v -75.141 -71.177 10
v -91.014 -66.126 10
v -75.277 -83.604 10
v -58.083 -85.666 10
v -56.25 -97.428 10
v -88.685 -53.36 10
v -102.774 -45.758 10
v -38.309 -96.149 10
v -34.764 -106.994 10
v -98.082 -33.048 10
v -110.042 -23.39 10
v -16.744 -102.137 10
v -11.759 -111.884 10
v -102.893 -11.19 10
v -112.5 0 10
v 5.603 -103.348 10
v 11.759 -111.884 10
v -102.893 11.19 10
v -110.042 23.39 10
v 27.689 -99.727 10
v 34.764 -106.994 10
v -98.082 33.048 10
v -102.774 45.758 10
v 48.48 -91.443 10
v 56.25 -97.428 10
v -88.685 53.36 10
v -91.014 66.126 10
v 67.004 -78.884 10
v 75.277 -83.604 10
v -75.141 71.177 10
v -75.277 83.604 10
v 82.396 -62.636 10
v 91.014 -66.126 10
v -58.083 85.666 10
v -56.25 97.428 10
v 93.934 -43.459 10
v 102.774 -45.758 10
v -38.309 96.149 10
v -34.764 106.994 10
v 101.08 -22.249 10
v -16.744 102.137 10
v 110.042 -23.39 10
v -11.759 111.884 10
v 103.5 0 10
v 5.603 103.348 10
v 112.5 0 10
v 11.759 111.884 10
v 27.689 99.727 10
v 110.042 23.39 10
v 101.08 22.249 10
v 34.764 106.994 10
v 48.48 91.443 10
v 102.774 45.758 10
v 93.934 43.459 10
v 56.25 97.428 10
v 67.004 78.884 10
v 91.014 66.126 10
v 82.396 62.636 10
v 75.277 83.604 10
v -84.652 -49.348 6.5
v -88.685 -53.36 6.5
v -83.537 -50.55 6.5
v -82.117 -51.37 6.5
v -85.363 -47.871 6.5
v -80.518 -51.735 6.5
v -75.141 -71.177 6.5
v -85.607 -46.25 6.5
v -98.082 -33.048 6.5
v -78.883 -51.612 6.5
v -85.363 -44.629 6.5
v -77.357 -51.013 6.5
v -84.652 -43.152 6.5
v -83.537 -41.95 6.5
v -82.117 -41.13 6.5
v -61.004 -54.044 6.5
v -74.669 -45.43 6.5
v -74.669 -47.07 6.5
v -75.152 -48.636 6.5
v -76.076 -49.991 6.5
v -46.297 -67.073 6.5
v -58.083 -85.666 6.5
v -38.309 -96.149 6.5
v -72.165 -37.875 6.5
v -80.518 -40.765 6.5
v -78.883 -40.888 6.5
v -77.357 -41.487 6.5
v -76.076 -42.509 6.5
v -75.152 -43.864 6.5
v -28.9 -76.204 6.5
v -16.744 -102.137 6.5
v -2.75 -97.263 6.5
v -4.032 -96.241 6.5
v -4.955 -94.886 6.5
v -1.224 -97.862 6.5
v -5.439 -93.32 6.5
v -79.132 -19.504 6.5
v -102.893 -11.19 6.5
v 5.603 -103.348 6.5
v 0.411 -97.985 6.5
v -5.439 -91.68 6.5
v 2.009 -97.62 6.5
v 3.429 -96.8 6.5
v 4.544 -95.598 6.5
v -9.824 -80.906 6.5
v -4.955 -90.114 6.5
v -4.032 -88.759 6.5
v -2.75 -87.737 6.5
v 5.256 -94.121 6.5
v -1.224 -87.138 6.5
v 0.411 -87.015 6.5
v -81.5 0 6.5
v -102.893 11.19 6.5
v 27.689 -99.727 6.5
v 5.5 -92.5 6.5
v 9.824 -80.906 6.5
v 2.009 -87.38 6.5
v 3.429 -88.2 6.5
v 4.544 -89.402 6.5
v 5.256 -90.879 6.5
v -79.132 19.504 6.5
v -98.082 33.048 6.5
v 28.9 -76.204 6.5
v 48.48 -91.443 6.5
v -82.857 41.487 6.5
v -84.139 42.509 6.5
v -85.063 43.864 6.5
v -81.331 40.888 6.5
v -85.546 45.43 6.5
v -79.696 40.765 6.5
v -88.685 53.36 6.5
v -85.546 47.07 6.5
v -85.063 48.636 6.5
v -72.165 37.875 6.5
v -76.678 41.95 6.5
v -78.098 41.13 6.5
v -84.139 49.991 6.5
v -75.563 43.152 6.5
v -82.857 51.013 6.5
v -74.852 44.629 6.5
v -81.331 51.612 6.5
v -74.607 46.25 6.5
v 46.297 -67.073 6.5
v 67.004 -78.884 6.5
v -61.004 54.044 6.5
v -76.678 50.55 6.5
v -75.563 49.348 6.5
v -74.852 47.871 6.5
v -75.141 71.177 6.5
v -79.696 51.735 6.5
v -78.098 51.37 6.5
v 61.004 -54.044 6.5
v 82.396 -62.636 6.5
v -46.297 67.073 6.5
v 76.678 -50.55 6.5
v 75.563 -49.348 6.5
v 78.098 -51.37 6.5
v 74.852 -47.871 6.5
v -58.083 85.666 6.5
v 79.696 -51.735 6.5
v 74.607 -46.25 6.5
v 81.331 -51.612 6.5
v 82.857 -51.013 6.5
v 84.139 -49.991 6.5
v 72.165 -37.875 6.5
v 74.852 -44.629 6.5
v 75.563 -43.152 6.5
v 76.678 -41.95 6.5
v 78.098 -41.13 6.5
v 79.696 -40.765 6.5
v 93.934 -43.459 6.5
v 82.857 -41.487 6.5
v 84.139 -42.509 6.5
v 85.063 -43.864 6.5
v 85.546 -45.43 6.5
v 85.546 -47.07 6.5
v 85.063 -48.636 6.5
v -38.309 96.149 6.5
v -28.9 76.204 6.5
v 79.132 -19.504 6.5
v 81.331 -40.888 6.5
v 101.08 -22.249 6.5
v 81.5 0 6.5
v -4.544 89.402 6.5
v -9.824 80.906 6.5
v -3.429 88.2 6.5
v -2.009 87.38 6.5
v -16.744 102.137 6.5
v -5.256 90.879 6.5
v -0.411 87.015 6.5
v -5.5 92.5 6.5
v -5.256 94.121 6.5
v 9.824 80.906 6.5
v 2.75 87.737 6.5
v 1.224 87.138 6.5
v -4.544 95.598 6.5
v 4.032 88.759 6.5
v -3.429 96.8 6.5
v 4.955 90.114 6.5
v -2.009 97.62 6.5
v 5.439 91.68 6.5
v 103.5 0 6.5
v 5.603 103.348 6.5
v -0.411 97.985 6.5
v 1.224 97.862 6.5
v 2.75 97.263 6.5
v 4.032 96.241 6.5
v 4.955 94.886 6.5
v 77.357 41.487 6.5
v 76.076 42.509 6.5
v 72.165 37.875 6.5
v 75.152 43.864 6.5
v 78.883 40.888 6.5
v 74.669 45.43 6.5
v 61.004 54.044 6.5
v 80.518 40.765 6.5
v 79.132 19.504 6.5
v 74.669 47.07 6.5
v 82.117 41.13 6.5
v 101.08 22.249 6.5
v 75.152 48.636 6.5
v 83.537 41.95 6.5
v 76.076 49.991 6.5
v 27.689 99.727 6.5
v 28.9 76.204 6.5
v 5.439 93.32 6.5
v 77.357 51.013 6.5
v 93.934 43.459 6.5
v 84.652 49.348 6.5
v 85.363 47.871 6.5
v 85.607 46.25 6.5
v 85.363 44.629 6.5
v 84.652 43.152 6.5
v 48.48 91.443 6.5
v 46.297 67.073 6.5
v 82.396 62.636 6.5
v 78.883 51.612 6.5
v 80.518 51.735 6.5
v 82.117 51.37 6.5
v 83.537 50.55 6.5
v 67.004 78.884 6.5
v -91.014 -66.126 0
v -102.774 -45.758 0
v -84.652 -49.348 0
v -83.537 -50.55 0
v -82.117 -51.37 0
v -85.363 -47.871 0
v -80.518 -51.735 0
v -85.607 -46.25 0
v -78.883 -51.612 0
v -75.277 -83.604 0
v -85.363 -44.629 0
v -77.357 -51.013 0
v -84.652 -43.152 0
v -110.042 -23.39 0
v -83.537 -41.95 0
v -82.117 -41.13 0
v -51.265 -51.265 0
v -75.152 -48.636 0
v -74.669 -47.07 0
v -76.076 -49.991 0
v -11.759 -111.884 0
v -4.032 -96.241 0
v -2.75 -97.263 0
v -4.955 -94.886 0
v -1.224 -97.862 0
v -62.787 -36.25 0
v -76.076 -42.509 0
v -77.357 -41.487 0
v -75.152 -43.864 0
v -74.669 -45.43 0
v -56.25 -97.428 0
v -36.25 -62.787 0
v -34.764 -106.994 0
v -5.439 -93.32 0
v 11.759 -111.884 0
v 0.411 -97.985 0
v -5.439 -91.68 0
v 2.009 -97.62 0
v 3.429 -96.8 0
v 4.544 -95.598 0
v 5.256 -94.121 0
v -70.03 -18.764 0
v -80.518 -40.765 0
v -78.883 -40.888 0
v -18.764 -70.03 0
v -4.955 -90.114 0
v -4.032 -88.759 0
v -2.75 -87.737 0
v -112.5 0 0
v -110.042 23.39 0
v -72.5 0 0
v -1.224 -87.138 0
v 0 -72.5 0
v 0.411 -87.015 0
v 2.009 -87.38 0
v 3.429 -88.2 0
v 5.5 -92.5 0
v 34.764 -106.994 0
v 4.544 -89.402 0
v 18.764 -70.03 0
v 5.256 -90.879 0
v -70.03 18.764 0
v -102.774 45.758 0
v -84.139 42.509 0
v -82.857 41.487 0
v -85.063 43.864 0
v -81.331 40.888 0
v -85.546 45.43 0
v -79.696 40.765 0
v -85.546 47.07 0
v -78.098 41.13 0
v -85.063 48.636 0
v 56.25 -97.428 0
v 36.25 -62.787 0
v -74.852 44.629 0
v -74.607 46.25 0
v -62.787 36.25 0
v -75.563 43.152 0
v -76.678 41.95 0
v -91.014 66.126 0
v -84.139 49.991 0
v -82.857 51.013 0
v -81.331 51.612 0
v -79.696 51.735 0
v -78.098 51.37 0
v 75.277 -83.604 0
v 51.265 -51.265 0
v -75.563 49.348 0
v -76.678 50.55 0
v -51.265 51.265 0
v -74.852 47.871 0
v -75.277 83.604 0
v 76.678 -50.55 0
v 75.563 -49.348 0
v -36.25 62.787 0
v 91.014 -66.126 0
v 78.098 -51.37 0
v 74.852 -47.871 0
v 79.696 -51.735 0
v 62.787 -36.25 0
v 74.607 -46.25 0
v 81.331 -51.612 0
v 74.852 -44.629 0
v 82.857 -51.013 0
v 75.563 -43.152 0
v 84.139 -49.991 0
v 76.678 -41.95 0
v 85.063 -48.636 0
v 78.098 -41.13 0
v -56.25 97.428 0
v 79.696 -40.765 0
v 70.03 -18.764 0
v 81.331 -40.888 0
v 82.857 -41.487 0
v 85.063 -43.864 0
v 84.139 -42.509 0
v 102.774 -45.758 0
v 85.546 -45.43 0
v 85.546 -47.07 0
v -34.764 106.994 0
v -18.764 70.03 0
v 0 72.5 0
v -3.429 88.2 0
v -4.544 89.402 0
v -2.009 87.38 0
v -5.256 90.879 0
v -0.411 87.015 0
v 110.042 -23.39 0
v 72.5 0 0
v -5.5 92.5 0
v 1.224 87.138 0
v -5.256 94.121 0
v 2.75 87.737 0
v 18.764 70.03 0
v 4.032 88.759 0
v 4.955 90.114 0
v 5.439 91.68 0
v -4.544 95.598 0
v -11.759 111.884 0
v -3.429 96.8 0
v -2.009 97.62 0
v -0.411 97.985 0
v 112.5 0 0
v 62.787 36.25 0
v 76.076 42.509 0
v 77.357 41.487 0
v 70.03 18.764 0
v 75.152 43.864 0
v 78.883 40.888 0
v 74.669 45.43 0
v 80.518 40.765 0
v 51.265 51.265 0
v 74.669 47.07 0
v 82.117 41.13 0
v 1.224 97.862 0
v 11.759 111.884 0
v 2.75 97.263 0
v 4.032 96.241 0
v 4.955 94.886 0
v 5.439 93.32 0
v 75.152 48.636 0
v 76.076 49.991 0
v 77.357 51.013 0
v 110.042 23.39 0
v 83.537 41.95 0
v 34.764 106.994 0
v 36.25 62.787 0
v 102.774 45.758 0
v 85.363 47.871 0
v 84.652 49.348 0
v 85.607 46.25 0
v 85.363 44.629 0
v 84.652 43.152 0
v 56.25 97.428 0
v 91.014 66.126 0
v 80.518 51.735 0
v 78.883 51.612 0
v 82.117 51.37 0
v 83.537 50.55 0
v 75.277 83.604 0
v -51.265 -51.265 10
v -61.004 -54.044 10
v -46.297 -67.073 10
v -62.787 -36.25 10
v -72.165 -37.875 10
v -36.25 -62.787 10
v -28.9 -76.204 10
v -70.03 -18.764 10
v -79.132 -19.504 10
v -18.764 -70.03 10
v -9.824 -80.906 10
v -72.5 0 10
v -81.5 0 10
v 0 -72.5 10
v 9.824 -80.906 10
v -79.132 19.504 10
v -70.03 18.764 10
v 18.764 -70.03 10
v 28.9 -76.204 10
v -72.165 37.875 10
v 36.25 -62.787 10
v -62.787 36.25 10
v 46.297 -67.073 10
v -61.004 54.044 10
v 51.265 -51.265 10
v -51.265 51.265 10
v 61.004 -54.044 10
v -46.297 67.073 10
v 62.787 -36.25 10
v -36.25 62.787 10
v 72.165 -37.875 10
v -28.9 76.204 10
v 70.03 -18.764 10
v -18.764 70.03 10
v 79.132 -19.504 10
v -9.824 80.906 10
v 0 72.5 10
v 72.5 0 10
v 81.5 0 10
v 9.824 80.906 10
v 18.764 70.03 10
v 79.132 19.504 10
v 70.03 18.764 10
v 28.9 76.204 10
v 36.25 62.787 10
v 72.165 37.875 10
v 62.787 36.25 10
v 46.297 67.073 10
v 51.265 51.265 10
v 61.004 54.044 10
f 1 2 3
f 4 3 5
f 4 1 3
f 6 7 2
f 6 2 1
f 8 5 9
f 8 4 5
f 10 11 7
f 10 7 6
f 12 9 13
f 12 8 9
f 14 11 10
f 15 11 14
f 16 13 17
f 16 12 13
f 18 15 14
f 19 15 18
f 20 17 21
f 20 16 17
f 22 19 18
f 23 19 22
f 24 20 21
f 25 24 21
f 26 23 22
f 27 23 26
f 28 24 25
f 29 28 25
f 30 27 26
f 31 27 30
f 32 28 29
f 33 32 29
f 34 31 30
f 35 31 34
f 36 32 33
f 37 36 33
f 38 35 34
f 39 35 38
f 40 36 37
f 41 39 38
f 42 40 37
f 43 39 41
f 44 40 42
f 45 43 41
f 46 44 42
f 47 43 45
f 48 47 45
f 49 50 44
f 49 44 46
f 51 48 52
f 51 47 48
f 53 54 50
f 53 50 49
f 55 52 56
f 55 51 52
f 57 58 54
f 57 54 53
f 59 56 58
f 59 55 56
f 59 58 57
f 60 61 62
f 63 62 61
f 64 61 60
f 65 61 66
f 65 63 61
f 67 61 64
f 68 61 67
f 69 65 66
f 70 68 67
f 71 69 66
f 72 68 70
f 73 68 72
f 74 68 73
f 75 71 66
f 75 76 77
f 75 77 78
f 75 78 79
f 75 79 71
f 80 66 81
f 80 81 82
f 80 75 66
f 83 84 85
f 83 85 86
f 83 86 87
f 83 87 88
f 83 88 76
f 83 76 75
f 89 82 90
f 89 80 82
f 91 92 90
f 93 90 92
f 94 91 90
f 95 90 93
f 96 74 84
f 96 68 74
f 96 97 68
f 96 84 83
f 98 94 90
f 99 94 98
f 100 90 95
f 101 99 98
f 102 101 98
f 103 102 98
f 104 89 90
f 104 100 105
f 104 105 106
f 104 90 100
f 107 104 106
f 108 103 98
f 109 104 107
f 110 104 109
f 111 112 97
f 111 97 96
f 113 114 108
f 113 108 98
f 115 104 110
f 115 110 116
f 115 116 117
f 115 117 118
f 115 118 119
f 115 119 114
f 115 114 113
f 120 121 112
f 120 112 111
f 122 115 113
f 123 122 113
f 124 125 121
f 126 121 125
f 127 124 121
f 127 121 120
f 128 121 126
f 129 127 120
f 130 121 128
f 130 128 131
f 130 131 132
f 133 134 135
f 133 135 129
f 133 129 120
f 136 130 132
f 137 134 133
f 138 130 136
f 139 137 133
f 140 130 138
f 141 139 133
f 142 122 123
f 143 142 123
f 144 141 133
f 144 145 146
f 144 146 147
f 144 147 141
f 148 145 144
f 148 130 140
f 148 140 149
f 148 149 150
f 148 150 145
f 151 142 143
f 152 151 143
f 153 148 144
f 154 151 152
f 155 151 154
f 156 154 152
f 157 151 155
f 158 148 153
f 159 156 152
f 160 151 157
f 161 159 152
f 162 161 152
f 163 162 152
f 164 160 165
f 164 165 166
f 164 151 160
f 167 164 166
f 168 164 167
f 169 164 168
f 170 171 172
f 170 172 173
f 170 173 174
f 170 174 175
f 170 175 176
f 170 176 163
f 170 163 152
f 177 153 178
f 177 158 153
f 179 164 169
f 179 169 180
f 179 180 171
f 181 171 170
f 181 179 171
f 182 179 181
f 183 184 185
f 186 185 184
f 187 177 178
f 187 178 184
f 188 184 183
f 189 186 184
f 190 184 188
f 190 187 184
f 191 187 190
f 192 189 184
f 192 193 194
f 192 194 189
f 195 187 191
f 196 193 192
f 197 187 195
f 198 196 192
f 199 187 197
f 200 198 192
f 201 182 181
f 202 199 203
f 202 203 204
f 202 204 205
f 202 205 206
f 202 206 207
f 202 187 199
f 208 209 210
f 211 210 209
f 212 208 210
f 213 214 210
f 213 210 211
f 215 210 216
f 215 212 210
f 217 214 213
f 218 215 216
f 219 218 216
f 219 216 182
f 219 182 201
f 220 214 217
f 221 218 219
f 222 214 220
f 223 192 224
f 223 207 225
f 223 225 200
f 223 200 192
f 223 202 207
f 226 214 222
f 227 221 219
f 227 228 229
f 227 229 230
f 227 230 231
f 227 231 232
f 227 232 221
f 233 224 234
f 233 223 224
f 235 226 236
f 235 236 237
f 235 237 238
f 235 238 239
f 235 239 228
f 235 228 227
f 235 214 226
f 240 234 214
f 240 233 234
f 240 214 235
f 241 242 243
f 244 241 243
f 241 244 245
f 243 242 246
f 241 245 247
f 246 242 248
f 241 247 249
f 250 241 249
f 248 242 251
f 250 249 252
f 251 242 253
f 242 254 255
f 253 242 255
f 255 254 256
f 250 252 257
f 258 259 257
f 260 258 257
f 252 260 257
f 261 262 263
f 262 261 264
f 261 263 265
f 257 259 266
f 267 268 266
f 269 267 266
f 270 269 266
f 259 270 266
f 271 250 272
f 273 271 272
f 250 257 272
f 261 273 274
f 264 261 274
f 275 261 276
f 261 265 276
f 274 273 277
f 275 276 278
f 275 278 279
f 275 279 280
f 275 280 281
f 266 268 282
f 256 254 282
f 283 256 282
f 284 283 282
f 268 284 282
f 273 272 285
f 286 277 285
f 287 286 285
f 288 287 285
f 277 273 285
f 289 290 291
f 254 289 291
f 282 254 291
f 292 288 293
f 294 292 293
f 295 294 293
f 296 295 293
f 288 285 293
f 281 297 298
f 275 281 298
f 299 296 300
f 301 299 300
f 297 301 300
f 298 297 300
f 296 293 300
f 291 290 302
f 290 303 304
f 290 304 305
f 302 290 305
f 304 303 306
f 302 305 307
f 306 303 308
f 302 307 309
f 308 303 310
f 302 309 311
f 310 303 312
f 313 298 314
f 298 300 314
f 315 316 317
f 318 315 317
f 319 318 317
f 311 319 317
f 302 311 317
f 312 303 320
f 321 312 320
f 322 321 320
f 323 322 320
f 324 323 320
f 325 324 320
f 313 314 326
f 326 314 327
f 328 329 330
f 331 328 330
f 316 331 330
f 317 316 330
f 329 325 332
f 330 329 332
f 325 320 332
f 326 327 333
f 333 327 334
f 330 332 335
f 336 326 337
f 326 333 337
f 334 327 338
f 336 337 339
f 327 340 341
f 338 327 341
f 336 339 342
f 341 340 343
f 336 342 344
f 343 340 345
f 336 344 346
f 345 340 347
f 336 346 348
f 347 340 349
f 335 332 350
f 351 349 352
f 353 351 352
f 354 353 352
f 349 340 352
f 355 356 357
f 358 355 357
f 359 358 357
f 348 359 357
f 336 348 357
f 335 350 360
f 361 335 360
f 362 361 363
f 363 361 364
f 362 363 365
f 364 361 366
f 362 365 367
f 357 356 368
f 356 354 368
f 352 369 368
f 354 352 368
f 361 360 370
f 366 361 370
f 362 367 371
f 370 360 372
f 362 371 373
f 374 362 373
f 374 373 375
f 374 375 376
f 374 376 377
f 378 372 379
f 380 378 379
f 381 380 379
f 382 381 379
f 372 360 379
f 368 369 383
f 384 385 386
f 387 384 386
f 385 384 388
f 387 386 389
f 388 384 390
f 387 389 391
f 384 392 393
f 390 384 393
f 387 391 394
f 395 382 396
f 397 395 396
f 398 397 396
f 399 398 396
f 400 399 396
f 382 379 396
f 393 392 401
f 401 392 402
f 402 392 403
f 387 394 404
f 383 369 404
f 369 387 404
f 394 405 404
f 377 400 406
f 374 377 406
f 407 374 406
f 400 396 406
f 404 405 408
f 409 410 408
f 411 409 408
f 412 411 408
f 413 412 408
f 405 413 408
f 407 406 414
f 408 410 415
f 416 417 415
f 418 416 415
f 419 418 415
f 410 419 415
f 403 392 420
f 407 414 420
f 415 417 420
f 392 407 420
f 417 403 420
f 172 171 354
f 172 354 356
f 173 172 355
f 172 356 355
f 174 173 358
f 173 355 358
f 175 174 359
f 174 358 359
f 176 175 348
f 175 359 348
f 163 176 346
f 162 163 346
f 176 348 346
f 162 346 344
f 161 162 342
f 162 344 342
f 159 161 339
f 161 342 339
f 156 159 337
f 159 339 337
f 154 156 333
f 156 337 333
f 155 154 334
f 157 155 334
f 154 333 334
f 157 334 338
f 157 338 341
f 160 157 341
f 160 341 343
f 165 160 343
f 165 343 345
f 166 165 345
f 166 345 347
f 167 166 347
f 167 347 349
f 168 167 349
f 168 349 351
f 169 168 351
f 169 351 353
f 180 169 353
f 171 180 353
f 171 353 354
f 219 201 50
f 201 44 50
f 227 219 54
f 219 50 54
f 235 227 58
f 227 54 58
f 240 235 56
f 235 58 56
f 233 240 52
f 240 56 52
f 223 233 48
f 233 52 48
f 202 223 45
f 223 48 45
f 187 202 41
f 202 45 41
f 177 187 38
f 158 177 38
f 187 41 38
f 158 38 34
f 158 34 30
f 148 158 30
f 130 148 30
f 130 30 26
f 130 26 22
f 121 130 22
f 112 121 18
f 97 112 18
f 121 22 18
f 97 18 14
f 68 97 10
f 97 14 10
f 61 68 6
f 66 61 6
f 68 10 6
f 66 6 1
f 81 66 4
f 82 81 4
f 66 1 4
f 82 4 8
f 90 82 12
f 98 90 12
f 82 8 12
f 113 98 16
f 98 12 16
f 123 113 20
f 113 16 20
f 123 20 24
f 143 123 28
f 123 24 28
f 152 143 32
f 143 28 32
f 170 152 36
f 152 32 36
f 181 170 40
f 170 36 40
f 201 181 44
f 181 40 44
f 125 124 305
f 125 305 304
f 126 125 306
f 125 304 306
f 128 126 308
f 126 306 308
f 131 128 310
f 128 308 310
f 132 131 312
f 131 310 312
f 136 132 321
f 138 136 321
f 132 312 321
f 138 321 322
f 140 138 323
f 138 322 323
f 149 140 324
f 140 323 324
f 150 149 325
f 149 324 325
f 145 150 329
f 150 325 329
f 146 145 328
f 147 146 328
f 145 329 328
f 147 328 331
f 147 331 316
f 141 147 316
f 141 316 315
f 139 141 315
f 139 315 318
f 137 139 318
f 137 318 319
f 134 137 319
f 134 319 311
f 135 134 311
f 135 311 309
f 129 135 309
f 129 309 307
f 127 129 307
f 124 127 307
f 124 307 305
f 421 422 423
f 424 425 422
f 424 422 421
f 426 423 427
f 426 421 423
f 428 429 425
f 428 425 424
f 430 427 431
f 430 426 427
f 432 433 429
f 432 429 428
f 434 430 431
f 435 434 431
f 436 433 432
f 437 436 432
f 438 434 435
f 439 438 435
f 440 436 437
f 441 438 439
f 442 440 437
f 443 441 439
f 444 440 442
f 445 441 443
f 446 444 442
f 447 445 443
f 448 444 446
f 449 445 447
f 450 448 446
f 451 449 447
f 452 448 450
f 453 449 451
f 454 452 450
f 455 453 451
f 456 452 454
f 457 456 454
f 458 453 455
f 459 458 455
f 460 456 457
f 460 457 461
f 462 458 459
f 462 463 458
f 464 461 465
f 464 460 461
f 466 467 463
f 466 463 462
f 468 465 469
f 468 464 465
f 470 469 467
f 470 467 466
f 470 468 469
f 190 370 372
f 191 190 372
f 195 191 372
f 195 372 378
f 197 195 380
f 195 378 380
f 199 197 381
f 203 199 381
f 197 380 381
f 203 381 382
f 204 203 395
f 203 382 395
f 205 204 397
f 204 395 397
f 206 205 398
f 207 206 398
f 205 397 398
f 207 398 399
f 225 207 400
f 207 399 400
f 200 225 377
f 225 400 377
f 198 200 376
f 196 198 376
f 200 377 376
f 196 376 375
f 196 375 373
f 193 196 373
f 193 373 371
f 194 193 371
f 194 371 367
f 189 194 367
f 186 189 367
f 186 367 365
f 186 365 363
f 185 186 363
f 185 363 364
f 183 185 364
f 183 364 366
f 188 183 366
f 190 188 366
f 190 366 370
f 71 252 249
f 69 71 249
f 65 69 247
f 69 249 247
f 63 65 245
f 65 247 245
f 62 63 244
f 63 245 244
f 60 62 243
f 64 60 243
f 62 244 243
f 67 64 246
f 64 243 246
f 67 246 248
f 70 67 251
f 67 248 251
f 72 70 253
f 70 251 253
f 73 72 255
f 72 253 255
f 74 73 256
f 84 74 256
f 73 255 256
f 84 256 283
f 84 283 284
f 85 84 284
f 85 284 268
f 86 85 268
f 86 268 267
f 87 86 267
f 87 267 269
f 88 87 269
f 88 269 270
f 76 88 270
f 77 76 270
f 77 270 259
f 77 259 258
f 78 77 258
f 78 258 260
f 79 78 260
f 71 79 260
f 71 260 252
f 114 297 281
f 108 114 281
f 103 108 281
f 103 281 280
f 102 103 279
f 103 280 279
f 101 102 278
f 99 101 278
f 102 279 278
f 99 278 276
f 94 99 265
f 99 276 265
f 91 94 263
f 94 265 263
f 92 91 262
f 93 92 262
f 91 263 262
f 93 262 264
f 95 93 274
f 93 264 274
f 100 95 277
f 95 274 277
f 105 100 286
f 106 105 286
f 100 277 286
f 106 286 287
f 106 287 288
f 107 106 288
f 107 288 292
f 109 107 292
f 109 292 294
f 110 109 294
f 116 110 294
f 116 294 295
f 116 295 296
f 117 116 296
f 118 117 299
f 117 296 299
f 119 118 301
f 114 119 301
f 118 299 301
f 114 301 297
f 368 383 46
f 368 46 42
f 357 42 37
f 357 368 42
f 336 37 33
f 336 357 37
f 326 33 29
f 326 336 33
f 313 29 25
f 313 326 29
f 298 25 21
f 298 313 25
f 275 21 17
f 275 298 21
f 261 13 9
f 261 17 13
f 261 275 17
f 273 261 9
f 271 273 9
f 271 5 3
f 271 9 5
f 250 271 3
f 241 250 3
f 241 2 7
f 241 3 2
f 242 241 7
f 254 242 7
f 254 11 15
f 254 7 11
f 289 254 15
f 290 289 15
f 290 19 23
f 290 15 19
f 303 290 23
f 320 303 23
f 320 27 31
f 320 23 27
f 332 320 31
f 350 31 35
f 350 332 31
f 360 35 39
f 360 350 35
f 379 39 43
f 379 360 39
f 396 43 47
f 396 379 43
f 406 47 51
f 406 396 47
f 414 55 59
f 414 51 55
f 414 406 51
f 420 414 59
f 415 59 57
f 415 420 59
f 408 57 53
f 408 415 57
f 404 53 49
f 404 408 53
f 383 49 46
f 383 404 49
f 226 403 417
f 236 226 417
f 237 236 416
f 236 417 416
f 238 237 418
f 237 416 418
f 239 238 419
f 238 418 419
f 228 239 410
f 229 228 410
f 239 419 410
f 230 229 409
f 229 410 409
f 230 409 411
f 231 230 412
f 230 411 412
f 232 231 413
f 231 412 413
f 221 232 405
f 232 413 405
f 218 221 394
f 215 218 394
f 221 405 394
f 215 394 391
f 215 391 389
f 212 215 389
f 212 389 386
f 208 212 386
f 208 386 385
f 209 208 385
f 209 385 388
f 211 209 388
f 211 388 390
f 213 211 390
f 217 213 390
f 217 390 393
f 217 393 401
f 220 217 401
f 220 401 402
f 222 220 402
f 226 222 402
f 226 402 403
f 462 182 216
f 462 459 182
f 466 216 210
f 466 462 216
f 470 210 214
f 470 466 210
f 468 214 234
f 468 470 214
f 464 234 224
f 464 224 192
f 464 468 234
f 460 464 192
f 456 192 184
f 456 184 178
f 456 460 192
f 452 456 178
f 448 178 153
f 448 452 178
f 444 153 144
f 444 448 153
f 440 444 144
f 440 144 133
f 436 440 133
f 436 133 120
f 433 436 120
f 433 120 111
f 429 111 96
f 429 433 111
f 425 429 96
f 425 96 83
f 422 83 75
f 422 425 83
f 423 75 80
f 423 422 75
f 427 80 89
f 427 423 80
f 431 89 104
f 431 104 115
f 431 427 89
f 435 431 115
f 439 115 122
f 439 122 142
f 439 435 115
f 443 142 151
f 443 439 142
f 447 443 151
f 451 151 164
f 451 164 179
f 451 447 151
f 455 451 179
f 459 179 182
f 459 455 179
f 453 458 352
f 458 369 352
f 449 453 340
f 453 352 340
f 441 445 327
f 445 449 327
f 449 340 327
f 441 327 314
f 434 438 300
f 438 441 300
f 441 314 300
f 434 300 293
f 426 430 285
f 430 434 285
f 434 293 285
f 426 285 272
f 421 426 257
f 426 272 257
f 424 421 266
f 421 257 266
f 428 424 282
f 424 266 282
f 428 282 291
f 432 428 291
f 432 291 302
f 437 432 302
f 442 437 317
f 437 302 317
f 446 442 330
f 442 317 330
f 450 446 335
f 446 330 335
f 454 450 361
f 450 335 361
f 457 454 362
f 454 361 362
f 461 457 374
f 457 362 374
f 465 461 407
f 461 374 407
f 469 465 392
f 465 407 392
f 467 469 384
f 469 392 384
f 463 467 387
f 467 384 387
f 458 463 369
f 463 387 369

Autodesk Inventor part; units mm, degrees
ref_plane "YZ Plane" through (0, 0, 0) normal (1, 0, 0) x (0, 1, 0)
ref_plane "XZ Plane" through (0, 0, 0) normal (0, 1, 0) x (-1, 0, 0)
ref_plane "XY Plane" through (0, 0, 0) normal (0, 0, 1) x (1, 0, 0)
sketch "Sketch6" plane through (0, 0, 0) normal (0, 0, 1) x (1, 0, 0)
  circle A0 centre (0, 0) radius 72.5
  circle A1 centre (0, 0) radius 112.5
  dimension "d46" = 145
  dimension "d47" = 225
extrude "Plate1" add sketch "Sketch6" along normal blind 10
sketch "Sketch7" plane through (0, 0, 10) normal (0, 0, 1) x (1, 0, 0)
  circle A0 centre (0, 0) radius 81.5
  circle A1 centre (0, 0) radius 103.5
  dimension "d57" = 163
  dimension "d58" = 207
extrude "Extrusion5" cut sketch "Sketch7" against normal blind 3.5
sketch "Sketch8" plane through (0, 0, 0) normal (0, 0, -1) x (-1, 0, 0)
  circle A0 centre (0, 92.5) radius 5.5
  circle A1 centre (0, 0) radius 92.5 construction
  dimension "d51" = 185
  dimension "d50" = 11
extrude "Extrusion6" cut sketch "Sketch8" along normal through all both and the other way through all
pattern_circular "Circular Pattern3" count 6 over 360 about axis through (0, 0, 0) along (0, 0, 1) of "Extrusion6"
equation "\"d47\" = back_steel_circle_диам_центров + back_steel_circle_ширина_кольца"
equation "\"d51\" = back_steel_circle_диам_центров"
equation "\"d45\" = Thickness"
equation "\"BendReliefDepth\" = 0.5 * Thickness"
equation "\"back_steel_circle_диам_центров\" = 185"
equation "\"back_steel_circle_ширина_кольца\" = 40"
equation "\"Thickness\" = 10"
properties part number "NVPH-322 joint HDPE ring"
